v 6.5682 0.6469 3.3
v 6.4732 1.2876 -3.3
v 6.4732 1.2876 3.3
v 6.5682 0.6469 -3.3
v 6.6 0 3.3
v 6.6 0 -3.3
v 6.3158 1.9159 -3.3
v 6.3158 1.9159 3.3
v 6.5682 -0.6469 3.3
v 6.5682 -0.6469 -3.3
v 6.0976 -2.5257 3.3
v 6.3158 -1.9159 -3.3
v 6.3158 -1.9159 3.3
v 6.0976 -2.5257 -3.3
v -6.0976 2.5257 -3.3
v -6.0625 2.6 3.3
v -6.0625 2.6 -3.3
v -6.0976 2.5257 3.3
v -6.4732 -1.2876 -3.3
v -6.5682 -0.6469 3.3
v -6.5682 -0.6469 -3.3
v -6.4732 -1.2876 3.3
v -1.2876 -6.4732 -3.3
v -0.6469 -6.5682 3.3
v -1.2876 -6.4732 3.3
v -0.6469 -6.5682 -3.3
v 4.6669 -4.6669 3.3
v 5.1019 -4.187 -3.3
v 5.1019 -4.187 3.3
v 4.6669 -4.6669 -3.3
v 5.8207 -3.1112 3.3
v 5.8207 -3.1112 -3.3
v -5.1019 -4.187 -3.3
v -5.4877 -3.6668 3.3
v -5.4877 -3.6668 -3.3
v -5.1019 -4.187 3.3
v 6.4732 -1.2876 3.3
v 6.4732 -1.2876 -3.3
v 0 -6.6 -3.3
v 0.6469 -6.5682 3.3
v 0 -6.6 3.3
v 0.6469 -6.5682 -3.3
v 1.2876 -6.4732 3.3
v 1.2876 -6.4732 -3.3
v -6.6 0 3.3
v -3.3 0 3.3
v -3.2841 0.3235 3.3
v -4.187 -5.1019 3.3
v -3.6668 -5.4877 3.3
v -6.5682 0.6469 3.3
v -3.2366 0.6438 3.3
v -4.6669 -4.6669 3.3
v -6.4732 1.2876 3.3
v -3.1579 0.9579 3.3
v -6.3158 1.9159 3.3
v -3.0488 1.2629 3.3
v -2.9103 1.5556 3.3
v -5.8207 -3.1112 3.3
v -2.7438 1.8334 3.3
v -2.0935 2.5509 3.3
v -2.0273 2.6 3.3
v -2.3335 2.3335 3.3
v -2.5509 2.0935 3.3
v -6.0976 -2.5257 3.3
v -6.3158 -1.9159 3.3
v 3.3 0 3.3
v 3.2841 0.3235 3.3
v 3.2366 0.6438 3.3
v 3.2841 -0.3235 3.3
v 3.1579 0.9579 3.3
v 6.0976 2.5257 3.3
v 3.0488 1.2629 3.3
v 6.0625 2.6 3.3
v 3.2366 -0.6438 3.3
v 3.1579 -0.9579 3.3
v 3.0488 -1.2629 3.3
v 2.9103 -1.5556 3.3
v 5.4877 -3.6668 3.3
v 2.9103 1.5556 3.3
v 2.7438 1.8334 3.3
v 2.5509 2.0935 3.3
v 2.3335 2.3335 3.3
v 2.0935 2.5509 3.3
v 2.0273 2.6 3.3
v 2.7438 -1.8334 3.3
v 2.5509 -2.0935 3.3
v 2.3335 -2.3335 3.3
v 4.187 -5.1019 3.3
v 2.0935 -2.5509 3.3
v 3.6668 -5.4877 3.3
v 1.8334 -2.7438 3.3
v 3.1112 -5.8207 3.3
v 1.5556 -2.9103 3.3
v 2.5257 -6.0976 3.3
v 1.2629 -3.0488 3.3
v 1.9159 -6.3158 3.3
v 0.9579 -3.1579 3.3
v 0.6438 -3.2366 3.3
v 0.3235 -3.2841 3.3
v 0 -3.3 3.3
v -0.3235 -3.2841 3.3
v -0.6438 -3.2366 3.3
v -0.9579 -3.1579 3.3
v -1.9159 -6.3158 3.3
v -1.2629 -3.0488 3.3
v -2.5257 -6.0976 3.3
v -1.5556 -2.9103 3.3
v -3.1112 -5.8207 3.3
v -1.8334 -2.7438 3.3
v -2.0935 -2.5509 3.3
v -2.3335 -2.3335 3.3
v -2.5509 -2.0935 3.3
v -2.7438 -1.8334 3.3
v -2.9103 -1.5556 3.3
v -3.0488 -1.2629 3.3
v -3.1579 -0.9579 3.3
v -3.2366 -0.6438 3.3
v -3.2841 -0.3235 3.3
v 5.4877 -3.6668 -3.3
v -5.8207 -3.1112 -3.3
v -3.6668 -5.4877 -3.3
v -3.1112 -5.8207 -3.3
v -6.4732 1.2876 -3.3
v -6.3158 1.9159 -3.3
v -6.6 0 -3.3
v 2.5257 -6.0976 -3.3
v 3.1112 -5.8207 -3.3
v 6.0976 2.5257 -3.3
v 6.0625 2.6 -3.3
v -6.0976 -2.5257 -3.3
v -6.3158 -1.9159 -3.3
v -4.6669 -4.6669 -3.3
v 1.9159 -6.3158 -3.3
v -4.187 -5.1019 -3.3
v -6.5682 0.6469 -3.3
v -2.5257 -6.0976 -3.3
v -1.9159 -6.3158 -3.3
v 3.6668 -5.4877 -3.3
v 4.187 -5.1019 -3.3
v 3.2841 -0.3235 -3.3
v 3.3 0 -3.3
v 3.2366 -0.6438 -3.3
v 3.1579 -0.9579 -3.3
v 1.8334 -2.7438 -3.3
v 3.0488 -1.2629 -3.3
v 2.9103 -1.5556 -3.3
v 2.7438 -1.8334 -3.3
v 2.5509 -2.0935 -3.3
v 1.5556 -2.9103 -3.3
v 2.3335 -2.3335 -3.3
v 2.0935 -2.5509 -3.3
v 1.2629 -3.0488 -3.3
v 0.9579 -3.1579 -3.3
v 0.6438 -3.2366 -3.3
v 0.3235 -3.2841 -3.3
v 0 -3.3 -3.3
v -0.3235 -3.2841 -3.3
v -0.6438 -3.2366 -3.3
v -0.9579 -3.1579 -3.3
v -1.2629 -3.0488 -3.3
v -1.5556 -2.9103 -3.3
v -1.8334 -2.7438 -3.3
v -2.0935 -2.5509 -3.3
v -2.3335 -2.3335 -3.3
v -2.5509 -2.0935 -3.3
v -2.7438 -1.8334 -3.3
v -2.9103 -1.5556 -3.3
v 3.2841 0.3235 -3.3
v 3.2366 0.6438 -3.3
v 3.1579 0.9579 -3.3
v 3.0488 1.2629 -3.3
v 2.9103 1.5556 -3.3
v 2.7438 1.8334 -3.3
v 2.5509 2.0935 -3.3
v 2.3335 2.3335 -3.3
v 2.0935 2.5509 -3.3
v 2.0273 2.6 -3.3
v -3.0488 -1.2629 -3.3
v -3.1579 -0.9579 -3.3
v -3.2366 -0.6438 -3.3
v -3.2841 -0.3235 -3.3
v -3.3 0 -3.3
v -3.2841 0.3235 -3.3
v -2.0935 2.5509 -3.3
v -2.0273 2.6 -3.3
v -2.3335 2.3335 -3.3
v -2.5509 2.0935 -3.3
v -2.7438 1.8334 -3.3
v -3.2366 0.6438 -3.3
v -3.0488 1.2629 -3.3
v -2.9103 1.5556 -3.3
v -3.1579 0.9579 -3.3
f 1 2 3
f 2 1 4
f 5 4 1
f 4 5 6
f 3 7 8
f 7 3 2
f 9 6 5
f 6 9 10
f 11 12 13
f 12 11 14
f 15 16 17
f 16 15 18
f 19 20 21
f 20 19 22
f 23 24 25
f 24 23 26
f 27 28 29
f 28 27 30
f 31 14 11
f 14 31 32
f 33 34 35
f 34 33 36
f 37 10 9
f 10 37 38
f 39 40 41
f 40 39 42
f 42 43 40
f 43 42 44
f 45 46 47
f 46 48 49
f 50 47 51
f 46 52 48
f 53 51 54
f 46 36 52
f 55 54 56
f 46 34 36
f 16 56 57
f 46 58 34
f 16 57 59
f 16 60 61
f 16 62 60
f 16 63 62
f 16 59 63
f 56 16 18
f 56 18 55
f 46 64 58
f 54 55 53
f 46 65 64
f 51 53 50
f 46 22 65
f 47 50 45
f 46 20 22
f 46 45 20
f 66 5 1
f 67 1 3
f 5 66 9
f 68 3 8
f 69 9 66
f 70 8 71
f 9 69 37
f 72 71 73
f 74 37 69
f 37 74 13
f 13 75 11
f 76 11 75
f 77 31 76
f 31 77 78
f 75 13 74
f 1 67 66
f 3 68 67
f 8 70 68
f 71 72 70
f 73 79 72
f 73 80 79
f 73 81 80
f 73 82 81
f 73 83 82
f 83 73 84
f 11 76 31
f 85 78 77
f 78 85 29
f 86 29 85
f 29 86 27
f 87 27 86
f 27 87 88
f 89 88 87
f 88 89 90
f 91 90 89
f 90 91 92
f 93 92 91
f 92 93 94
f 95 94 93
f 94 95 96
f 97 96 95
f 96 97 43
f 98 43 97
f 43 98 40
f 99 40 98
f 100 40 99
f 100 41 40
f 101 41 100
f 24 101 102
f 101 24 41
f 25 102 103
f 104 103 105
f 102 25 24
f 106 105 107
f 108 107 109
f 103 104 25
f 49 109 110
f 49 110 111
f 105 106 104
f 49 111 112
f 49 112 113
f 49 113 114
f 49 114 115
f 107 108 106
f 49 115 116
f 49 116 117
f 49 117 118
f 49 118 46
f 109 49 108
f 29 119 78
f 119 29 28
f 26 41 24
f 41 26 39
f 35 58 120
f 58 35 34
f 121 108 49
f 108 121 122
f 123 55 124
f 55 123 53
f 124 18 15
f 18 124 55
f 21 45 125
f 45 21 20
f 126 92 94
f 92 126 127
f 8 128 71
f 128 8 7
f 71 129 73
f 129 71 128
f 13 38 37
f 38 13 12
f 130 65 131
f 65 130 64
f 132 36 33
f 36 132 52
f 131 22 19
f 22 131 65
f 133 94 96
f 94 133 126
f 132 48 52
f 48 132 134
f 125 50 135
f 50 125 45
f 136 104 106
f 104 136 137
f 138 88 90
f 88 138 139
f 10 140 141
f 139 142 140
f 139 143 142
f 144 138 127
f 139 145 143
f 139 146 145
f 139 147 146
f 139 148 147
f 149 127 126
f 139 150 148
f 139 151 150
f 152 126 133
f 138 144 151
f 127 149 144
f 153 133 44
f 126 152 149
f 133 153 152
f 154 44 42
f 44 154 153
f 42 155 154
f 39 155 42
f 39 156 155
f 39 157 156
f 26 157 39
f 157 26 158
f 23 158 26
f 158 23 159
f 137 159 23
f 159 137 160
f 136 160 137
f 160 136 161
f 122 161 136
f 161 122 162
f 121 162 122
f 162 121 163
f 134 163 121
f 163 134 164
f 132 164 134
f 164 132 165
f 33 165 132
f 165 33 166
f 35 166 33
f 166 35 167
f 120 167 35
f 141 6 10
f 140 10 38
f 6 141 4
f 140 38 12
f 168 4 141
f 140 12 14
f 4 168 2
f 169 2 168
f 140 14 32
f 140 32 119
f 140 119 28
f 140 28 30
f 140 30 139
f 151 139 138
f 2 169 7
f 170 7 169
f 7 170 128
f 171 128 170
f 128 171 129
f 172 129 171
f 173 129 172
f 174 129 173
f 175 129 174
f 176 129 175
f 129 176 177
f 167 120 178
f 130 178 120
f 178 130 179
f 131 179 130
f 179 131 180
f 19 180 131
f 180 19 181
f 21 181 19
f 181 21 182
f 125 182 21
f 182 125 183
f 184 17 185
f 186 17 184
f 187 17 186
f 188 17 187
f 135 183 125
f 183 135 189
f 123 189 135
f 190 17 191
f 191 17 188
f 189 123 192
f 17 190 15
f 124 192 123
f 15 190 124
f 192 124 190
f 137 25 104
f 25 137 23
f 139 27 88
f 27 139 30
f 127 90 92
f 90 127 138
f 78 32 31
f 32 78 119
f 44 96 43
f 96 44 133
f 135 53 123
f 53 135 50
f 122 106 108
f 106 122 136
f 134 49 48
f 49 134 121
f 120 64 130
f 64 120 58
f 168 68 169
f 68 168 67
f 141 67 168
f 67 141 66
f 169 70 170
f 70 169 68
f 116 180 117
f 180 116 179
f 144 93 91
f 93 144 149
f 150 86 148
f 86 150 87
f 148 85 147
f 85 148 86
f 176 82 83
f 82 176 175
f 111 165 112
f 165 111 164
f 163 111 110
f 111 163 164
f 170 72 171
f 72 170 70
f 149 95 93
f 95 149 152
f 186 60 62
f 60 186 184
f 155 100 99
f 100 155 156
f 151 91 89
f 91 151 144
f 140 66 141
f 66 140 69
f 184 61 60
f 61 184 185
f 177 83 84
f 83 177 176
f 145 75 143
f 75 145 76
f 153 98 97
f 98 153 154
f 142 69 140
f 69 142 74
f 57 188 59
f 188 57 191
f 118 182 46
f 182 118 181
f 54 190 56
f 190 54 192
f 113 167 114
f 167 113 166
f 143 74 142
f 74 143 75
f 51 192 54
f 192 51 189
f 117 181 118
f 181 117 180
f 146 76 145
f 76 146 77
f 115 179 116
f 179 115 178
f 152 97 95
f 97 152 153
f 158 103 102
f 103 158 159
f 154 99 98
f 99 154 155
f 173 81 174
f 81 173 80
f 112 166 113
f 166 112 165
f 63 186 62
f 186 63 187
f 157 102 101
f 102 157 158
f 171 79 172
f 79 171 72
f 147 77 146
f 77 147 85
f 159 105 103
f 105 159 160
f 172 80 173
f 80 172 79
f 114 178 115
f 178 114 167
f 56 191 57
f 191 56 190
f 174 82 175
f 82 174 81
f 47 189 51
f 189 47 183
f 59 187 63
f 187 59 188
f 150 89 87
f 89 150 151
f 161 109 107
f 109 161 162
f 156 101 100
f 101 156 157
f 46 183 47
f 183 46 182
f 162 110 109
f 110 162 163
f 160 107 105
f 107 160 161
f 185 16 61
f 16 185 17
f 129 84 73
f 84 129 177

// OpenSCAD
// COBRA Vertebra - T11 V17
// Height: 6.6000000000000005mm, OD: 13.200000000000001mm

$fn = 64;

difference() {
    // Outer cylinder
    cylinder(h=6.6000000000000005, d=13.200000000000001, center=true);
    
    // Inner channel
    cylinder(h=8.600000000000001, d=6.6000000000000005, center=true);

    // Solar panel cavity
    translate([0, 4.6000000000000005, 0])
    cube([50, 4, 30], center=true);

    // Pivot holes
    translate([0, 6.6000000000000005, 0.30000000000000027])
    rotate([90, 0, 0])
    cylinder(h=5.300000000000001, d=4, center=true);
    
    translate([0, 6.6000000000000005, -0.30000000000000027])
    rotate([90, 0, 0])
    cylinder(h=5.300000000000001, d=4, center=true);
}
